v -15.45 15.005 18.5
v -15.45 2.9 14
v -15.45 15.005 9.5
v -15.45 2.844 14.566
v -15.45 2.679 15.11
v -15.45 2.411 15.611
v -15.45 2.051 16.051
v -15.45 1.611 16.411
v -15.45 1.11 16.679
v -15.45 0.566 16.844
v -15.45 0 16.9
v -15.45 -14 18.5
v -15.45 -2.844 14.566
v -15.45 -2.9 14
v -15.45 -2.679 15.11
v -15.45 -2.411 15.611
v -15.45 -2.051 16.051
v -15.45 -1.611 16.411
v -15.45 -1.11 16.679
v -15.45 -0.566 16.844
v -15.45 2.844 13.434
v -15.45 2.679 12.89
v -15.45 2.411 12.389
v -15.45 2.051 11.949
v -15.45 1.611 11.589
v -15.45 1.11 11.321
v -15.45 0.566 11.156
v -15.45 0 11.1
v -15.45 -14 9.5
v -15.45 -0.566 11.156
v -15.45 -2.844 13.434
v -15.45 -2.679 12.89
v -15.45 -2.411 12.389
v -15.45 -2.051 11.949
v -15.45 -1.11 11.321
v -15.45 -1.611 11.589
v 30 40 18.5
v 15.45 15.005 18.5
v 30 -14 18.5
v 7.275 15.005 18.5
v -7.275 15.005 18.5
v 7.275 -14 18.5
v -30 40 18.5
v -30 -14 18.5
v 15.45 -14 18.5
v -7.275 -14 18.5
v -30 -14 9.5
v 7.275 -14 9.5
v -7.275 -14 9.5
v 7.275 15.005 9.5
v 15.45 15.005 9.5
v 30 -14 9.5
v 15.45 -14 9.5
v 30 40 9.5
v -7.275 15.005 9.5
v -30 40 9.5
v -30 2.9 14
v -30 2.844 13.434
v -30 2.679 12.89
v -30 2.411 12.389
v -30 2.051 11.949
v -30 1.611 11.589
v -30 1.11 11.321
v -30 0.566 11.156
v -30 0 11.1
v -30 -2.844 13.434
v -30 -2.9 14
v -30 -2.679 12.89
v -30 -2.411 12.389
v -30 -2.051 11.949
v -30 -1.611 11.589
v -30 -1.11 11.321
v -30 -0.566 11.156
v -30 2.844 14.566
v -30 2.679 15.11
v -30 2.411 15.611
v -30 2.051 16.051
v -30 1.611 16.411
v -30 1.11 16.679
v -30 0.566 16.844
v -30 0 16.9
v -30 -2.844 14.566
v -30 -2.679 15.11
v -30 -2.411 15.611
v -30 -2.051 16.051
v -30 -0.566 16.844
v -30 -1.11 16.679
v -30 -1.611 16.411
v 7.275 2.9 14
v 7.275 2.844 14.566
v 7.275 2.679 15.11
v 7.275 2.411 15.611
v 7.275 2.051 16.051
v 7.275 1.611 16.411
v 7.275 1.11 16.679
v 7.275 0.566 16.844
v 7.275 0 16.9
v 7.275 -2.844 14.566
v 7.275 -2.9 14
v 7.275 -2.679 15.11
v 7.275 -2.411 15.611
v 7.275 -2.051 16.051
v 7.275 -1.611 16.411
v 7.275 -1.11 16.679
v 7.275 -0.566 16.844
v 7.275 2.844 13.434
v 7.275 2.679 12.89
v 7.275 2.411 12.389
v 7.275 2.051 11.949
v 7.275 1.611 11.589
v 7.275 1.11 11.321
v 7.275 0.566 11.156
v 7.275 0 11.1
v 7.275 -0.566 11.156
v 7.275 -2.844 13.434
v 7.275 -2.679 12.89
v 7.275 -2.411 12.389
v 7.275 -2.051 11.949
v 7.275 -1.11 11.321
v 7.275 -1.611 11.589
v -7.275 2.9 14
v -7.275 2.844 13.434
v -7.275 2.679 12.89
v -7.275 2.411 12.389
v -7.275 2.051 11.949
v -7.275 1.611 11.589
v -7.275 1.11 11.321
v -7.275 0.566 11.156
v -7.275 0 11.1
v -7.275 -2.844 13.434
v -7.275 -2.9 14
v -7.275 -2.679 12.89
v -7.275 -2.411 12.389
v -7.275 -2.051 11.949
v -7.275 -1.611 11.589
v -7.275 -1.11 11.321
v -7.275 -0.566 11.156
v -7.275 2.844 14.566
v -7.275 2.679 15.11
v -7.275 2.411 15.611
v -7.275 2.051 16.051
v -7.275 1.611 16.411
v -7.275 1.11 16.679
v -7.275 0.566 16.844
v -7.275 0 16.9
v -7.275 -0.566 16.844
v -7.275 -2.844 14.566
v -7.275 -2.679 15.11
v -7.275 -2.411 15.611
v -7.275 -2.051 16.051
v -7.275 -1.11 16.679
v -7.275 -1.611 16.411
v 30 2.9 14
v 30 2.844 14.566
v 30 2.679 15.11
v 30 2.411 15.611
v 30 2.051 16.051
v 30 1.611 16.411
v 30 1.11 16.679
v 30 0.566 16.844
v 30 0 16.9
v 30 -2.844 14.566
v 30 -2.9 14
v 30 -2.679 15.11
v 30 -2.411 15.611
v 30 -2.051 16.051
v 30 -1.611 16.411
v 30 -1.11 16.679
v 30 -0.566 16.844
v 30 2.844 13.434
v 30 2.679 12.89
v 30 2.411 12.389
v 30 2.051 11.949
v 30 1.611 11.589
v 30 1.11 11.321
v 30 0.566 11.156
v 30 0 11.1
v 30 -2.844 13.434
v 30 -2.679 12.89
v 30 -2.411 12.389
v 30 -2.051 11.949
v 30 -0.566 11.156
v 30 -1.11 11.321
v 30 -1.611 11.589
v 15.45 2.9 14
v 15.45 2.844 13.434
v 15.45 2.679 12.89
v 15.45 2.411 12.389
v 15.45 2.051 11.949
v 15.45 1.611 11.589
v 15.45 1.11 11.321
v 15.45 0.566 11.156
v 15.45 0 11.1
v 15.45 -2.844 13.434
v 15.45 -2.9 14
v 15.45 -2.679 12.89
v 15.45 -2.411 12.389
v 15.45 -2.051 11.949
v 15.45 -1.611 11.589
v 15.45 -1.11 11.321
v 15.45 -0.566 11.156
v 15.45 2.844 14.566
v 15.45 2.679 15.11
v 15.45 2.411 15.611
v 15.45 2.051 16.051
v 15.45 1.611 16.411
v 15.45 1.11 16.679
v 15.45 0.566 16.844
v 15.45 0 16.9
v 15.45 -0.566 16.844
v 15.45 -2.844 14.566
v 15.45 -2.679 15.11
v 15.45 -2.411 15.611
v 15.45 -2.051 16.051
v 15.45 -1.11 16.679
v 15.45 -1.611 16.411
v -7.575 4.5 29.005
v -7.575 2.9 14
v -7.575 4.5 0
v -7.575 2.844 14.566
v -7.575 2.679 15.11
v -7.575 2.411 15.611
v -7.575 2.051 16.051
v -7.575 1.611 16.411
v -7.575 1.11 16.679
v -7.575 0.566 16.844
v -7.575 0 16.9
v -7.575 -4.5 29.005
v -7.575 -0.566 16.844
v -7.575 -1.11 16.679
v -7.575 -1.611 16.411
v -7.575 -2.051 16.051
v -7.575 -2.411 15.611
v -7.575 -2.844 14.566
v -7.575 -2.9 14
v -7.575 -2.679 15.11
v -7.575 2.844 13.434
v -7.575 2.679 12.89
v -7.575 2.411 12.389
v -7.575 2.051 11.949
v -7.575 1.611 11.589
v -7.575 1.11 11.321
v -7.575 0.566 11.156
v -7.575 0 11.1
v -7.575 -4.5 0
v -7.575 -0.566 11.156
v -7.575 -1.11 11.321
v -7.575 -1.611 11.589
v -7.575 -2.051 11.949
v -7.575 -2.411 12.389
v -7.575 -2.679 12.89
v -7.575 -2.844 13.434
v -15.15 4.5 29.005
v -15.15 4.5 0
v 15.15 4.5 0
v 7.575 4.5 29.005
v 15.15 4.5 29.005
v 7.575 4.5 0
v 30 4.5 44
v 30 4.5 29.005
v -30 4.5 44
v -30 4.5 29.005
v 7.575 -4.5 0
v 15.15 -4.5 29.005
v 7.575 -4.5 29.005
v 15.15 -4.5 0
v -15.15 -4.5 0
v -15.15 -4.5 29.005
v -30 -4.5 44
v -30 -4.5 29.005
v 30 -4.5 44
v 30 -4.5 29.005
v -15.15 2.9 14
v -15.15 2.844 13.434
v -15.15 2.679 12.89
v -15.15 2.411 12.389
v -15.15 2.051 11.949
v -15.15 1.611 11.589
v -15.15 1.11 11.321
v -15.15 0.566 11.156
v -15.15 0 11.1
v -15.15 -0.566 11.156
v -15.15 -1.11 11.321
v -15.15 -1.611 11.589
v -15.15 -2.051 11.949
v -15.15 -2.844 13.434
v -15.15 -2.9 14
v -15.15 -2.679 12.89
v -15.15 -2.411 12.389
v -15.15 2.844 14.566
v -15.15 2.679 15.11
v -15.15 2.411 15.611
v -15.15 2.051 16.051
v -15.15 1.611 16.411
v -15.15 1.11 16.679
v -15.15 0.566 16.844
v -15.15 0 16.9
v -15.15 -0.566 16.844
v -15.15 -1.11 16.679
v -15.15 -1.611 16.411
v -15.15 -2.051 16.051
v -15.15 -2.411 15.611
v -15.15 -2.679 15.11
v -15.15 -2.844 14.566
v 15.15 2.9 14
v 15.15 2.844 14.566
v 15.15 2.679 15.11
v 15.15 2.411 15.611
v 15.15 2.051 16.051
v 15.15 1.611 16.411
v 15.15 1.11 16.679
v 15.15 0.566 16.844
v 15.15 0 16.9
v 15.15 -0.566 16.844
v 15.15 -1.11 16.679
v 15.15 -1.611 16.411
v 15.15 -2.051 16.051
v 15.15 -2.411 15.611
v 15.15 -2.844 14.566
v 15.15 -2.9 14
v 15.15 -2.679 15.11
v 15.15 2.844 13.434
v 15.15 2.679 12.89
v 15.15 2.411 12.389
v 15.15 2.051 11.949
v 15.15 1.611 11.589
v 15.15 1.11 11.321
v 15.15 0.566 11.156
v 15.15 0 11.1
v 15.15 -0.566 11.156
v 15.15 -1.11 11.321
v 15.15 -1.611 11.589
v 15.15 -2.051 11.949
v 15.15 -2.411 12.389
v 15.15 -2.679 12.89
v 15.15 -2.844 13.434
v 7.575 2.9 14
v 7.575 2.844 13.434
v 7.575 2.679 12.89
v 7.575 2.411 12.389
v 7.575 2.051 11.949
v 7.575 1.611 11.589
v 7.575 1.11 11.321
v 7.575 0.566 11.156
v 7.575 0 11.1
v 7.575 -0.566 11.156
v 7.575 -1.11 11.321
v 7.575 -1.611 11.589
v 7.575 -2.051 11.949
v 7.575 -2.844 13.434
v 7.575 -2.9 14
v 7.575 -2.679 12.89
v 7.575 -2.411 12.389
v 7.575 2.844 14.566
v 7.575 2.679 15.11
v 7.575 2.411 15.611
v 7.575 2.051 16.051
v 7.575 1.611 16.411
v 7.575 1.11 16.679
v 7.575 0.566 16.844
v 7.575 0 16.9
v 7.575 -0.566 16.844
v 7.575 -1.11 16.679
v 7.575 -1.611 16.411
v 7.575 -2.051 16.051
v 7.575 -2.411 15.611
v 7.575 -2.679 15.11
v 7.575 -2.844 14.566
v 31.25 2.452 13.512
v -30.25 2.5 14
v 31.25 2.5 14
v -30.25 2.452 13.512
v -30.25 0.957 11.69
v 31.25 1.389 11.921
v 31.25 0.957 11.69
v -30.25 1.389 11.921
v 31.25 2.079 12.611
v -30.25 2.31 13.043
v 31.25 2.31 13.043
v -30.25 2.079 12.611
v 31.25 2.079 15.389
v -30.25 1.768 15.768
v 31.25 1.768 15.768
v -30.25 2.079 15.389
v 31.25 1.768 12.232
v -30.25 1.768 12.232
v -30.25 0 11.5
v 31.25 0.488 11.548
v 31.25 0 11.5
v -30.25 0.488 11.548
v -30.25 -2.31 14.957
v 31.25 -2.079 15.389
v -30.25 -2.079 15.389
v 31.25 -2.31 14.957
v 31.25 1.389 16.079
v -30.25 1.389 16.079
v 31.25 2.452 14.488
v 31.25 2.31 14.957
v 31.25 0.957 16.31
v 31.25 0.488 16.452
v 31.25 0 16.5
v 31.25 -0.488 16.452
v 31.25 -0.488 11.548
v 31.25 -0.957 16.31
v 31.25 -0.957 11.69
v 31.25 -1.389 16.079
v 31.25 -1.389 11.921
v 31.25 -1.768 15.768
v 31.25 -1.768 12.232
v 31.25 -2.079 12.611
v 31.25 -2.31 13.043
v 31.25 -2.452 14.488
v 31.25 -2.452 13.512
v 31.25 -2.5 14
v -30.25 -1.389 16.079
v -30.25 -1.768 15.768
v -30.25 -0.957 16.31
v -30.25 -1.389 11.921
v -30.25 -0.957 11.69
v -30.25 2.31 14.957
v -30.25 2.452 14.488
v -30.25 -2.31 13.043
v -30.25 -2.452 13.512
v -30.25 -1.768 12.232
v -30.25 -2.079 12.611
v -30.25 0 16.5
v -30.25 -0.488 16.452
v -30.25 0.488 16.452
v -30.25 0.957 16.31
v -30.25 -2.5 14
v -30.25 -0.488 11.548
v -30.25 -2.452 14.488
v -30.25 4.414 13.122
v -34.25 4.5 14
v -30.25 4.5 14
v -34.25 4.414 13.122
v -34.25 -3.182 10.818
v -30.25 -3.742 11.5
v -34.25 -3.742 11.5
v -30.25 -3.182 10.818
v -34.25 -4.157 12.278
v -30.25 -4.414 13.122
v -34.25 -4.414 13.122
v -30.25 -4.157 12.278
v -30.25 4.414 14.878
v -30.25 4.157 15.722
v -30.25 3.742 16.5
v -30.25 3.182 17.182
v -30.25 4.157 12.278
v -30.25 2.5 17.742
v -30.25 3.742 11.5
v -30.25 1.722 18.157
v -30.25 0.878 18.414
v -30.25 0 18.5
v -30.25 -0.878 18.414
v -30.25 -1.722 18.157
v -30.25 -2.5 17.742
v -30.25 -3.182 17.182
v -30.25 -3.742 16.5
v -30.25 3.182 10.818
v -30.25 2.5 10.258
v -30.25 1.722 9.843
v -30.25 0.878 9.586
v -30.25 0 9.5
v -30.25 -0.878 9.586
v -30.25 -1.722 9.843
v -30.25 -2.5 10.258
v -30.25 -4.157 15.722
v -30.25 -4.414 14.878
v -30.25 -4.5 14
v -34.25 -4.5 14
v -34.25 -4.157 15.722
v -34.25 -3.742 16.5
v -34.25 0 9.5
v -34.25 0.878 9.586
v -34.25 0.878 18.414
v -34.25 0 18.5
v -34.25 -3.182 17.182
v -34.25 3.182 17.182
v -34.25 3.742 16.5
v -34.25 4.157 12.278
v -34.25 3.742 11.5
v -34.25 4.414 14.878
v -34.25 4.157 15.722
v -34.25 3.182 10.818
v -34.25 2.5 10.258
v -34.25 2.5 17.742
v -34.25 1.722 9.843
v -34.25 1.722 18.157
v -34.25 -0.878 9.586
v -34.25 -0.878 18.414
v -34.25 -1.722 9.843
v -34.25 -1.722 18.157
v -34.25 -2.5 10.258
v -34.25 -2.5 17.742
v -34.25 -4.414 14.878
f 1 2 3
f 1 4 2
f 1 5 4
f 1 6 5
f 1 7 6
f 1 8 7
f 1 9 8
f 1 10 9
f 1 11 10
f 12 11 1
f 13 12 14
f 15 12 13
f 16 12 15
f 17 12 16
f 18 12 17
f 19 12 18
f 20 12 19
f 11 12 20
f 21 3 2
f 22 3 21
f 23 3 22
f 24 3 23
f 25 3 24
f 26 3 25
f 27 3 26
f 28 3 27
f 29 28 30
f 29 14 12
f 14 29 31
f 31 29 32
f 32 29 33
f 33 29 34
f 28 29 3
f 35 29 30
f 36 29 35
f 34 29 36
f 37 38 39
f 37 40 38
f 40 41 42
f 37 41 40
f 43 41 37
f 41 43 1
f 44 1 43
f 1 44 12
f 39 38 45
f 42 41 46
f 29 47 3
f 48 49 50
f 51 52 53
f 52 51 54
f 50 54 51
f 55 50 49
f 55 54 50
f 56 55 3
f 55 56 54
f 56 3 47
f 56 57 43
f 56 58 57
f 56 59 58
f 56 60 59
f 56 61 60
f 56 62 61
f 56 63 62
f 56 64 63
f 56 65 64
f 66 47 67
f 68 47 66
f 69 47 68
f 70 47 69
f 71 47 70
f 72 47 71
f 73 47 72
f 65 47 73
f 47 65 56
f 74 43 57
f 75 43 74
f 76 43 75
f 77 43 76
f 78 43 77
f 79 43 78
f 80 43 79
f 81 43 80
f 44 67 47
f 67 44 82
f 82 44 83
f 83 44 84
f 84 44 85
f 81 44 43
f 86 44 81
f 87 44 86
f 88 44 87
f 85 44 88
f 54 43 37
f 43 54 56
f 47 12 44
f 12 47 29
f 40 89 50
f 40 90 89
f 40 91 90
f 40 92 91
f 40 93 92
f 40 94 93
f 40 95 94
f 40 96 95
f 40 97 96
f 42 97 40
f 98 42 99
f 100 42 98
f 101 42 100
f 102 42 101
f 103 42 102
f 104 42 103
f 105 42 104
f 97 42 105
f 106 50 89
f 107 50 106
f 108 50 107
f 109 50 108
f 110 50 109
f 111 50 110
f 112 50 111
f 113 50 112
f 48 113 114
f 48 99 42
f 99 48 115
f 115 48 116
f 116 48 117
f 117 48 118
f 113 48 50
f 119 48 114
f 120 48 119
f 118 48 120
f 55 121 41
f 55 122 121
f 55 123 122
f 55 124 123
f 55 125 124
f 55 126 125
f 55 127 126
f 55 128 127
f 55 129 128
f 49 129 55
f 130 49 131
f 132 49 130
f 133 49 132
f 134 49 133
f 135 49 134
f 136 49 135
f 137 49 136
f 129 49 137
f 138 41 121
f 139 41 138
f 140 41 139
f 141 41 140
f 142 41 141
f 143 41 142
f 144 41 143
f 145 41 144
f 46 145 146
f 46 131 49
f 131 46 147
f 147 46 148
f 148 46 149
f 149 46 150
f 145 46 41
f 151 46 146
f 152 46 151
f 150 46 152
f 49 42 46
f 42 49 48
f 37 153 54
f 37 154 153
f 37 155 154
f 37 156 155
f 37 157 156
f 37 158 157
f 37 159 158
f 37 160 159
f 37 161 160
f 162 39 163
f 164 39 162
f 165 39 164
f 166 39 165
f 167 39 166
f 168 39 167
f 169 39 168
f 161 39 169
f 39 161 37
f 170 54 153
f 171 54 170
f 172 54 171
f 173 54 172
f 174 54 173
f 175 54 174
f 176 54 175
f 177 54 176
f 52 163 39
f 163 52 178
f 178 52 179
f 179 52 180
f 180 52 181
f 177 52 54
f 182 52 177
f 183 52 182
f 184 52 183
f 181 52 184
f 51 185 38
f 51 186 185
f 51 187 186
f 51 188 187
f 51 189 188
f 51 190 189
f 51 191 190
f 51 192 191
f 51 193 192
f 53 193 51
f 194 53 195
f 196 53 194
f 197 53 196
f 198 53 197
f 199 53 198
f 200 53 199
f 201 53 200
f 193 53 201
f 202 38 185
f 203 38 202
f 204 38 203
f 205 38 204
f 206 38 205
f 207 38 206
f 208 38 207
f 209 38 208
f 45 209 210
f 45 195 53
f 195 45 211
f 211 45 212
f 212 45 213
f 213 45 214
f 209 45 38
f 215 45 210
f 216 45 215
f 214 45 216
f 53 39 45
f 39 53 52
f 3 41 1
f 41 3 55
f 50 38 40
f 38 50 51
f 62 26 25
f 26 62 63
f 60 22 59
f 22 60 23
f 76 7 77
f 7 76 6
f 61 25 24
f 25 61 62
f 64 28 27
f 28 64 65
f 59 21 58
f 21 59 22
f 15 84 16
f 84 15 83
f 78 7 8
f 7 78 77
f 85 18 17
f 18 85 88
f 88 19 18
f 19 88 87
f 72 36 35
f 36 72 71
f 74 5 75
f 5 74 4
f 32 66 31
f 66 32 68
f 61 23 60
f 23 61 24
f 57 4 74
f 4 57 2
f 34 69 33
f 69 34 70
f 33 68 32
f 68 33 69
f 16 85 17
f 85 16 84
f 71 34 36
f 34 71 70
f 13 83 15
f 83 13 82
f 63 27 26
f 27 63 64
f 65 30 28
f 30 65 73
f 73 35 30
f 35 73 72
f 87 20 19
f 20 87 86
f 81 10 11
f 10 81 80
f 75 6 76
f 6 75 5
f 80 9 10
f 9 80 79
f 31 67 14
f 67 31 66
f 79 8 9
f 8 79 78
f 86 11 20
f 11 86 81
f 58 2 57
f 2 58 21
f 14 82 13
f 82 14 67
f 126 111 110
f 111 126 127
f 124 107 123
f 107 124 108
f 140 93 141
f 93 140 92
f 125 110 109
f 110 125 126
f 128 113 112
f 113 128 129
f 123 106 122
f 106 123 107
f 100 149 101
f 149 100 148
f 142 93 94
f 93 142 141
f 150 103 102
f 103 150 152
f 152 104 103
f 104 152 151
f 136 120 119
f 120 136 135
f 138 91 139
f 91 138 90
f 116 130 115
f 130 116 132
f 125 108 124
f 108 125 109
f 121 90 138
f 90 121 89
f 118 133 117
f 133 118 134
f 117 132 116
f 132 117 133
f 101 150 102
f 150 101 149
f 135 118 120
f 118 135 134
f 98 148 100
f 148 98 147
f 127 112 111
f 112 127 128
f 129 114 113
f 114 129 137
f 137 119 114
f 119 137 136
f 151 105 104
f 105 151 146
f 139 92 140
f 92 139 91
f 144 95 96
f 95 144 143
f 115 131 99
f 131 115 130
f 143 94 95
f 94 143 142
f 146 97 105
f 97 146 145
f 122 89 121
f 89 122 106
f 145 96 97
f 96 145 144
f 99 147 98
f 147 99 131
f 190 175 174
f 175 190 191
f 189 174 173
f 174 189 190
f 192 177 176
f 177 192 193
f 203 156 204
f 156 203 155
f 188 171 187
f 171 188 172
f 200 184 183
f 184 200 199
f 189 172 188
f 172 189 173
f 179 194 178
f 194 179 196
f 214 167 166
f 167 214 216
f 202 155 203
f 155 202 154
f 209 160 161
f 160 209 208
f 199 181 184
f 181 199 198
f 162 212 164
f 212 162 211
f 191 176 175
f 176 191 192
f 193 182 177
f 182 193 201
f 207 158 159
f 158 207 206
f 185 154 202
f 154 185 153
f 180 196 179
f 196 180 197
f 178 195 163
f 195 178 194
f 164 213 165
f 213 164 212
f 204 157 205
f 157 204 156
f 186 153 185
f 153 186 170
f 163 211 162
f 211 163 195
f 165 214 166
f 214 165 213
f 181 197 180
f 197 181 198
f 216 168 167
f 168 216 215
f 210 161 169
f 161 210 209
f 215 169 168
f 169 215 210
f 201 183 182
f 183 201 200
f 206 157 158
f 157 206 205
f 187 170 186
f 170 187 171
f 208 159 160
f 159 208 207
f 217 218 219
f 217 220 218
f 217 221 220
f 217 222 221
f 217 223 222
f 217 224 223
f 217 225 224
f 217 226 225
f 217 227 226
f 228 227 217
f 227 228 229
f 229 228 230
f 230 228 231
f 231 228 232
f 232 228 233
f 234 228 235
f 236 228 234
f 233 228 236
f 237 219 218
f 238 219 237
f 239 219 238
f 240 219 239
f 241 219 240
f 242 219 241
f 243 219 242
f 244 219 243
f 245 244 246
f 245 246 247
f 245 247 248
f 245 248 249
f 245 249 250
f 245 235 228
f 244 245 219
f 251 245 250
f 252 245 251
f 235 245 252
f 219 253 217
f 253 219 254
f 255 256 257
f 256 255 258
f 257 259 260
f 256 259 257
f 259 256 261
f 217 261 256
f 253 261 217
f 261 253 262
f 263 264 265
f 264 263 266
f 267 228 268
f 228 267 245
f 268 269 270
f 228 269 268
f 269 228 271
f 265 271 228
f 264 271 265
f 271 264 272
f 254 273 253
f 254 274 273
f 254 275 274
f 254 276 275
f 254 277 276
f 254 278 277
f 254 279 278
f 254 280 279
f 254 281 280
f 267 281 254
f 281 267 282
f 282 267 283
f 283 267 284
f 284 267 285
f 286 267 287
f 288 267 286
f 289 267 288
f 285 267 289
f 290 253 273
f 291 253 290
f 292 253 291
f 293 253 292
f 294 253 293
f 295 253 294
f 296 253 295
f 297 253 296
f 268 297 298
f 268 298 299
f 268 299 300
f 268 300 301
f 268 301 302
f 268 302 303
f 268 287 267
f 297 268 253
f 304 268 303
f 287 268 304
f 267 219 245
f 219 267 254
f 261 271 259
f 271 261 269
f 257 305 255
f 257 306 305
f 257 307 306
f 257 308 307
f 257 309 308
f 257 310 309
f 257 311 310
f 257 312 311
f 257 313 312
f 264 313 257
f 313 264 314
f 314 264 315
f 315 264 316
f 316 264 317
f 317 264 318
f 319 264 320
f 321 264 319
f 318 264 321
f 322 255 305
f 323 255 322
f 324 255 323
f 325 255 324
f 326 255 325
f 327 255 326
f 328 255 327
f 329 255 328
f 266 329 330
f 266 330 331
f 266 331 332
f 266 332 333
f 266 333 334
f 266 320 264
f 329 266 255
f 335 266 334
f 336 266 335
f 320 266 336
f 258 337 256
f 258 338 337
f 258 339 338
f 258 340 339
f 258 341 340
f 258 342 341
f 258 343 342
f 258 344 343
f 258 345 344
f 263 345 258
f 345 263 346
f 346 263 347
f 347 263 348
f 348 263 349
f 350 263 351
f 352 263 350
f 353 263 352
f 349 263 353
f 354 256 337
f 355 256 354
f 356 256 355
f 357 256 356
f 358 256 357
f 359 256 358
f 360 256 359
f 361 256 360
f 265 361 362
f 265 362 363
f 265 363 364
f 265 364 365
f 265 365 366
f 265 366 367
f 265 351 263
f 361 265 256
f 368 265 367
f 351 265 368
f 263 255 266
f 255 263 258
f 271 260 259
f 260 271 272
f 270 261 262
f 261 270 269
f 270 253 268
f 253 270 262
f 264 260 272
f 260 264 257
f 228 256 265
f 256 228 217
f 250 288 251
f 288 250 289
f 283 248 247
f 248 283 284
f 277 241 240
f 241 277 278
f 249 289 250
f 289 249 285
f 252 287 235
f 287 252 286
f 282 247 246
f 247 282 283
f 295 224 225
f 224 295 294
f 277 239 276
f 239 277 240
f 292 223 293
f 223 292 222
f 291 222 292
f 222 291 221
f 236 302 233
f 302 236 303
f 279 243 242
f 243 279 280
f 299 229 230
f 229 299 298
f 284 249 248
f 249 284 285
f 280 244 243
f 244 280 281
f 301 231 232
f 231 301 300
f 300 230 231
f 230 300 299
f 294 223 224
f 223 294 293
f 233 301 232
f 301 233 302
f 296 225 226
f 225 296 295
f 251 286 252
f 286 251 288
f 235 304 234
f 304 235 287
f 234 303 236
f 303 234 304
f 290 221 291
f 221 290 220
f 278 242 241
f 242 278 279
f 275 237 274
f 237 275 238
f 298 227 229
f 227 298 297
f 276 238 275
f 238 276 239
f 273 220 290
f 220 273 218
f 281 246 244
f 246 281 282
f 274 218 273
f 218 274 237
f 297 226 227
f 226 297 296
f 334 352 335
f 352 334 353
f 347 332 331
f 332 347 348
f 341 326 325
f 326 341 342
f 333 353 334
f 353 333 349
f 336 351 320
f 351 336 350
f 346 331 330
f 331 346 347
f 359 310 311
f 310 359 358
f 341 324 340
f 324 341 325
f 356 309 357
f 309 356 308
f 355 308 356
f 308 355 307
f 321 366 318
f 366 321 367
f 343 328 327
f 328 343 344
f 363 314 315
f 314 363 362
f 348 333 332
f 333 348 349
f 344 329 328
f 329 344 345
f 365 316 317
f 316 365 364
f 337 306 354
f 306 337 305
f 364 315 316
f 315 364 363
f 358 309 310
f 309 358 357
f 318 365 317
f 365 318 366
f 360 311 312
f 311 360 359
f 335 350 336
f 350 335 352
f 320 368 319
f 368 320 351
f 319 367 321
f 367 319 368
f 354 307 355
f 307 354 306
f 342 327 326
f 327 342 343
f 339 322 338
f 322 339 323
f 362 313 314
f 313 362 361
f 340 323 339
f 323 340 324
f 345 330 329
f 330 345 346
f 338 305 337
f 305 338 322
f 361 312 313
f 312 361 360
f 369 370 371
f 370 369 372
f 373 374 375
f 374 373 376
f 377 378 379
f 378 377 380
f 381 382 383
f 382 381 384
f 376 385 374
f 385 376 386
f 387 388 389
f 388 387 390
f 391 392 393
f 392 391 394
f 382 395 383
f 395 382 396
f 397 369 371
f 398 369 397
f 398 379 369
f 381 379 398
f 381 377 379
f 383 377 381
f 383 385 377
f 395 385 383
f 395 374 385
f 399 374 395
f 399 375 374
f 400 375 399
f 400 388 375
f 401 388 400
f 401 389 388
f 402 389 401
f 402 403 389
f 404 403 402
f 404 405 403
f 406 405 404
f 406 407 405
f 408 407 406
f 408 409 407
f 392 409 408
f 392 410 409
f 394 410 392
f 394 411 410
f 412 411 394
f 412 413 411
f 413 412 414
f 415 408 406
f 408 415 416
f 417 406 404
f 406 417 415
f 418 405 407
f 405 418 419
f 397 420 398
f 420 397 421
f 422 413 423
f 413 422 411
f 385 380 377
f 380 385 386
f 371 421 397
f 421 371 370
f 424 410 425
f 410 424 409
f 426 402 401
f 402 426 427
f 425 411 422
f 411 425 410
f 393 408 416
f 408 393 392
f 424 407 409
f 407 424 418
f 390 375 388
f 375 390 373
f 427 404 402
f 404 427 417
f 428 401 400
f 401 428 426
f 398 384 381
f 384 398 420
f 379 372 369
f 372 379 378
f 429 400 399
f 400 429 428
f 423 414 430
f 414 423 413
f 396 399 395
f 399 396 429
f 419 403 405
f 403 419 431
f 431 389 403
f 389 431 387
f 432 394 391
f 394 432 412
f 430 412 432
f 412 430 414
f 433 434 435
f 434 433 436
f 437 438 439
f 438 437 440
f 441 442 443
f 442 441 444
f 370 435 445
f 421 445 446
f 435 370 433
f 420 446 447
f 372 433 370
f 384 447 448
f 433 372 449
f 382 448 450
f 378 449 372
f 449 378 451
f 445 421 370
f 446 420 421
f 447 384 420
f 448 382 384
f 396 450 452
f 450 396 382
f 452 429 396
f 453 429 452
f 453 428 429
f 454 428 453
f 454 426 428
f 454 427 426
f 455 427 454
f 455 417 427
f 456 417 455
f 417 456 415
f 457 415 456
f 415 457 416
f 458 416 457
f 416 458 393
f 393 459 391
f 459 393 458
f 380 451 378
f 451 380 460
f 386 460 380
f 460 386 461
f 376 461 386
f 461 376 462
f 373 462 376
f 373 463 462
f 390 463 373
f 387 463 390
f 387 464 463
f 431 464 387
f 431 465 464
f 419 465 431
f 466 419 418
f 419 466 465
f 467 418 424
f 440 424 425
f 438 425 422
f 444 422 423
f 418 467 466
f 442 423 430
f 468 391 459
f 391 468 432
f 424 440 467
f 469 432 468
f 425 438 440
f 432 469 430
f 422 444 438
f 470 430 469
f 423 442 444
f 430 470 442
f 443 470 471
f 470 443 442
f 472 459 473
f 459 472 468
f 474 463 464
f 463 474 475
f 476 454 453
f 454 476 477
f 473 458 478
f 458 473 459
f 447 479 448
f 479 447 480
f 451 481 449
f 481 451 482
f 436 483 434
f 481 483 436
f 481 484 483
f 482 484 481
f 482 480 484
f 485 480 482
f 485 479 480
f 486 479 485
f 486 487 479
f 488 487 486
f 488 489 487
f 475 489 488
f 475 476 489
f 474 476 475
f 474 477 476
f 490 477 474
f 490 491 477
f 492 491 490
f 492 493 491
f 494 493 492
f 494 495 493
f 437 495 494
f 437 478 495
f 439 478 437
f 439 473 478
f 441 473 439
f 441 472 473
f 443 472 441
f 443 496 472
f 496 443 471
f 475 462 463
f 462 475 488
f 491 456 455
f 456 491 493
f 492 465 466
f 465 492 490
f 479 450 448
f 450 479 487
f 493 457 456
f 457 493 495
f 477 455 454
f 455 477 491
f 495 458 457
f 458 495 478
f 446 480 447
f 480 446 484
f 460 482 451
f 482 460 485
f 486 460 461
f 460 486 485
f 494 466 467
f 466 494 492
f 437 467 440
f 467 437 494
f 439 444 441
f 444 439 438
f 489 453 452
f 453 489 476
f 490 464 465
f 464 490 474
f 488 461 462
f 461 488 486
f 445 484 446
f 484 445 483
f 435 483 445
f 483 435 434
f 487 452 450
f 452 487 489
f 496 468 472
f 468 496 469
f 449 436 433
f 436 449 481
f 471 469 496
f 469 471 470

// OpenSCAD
$fn = 32;

// ------------------------------------------------------------------------
// Butt hinge: hinge 60 mm, leaf swung 270 deg
// Every part is its own module, assembly() places every instance.
// ------------------------------------------------------------------------

// --- part 1 ---
module hinge_base() {
  difference() {
    union() {
      translate([-30, -14, -4.5]) cube([14.55, 54, 9]);
      translate([-7.275, -14, -4.5]) cube([14.55, 54, 9]);
      translate([15.45, -14, -4.5]) cube([14.55, 54, 9]);
      translate([-30, 15.005, -4.5]) cube([60, 24.995, 9]);
    }
    translate([-22.725, 0, 0]) rotate([0, 90, 0]) cylinder(h = 16.55, d = 5.8, center = true);
    translate([0, 0, 0]) rotate([0, 90, 0]) cylinder(h = 16.55, d = 5.8, center = true);
    translate([22.725, 0, 0]) rotate([0, 90, 0]) cylinder(h = 16.55, d = 5.8, center = true);
  }
}

// --- part 2 ---
module hinge_mover() {
  difference() {
    union() {
      translate([-15.15, -30, -4.5]) cube([7.575, 44, 9]);
      translate([7.575, -30, -4.5]) cube([7.575, 44, 9]);
      translate([-30, -30, -4.5]) cube([60, 14.995, 9]);
    }
    translate([-11.362, 0, 0]) rotate([0, 90, 0]) cylinder(h = 9.575, d = 5.8, center = true);
    translate([11.362, 0, 0]) rotate([0, 90, 0]) cylinder(h = 9.575, d = 5.8, center = true);
  }
}

// --- part 3 ---
module hinge_pin() {
  rotate([0, 90, 0]) cylinder(h = 62.5, d = 5, center = true);
  translate([-34.25, 0, 0]) rotate([0, 90, 0]) cylinder(h = 4, d = 9);
}

// --- assembly ---
module assembly() {
  color([0.80, 0.24, 0.20]) translate([0, 0, 14]) rotate([0, 0, 0]) hinge_base();
  color([0.20, 0.45, 0.75]) translate([0, 0, 14]) rotate([270, 0, 0]) hinge_mover();
  color([0.25, 0.62, 0.32]) translate([0, 0, 14]) rotate([0, 0, 0]) hinge_pin();
}

assembly();
